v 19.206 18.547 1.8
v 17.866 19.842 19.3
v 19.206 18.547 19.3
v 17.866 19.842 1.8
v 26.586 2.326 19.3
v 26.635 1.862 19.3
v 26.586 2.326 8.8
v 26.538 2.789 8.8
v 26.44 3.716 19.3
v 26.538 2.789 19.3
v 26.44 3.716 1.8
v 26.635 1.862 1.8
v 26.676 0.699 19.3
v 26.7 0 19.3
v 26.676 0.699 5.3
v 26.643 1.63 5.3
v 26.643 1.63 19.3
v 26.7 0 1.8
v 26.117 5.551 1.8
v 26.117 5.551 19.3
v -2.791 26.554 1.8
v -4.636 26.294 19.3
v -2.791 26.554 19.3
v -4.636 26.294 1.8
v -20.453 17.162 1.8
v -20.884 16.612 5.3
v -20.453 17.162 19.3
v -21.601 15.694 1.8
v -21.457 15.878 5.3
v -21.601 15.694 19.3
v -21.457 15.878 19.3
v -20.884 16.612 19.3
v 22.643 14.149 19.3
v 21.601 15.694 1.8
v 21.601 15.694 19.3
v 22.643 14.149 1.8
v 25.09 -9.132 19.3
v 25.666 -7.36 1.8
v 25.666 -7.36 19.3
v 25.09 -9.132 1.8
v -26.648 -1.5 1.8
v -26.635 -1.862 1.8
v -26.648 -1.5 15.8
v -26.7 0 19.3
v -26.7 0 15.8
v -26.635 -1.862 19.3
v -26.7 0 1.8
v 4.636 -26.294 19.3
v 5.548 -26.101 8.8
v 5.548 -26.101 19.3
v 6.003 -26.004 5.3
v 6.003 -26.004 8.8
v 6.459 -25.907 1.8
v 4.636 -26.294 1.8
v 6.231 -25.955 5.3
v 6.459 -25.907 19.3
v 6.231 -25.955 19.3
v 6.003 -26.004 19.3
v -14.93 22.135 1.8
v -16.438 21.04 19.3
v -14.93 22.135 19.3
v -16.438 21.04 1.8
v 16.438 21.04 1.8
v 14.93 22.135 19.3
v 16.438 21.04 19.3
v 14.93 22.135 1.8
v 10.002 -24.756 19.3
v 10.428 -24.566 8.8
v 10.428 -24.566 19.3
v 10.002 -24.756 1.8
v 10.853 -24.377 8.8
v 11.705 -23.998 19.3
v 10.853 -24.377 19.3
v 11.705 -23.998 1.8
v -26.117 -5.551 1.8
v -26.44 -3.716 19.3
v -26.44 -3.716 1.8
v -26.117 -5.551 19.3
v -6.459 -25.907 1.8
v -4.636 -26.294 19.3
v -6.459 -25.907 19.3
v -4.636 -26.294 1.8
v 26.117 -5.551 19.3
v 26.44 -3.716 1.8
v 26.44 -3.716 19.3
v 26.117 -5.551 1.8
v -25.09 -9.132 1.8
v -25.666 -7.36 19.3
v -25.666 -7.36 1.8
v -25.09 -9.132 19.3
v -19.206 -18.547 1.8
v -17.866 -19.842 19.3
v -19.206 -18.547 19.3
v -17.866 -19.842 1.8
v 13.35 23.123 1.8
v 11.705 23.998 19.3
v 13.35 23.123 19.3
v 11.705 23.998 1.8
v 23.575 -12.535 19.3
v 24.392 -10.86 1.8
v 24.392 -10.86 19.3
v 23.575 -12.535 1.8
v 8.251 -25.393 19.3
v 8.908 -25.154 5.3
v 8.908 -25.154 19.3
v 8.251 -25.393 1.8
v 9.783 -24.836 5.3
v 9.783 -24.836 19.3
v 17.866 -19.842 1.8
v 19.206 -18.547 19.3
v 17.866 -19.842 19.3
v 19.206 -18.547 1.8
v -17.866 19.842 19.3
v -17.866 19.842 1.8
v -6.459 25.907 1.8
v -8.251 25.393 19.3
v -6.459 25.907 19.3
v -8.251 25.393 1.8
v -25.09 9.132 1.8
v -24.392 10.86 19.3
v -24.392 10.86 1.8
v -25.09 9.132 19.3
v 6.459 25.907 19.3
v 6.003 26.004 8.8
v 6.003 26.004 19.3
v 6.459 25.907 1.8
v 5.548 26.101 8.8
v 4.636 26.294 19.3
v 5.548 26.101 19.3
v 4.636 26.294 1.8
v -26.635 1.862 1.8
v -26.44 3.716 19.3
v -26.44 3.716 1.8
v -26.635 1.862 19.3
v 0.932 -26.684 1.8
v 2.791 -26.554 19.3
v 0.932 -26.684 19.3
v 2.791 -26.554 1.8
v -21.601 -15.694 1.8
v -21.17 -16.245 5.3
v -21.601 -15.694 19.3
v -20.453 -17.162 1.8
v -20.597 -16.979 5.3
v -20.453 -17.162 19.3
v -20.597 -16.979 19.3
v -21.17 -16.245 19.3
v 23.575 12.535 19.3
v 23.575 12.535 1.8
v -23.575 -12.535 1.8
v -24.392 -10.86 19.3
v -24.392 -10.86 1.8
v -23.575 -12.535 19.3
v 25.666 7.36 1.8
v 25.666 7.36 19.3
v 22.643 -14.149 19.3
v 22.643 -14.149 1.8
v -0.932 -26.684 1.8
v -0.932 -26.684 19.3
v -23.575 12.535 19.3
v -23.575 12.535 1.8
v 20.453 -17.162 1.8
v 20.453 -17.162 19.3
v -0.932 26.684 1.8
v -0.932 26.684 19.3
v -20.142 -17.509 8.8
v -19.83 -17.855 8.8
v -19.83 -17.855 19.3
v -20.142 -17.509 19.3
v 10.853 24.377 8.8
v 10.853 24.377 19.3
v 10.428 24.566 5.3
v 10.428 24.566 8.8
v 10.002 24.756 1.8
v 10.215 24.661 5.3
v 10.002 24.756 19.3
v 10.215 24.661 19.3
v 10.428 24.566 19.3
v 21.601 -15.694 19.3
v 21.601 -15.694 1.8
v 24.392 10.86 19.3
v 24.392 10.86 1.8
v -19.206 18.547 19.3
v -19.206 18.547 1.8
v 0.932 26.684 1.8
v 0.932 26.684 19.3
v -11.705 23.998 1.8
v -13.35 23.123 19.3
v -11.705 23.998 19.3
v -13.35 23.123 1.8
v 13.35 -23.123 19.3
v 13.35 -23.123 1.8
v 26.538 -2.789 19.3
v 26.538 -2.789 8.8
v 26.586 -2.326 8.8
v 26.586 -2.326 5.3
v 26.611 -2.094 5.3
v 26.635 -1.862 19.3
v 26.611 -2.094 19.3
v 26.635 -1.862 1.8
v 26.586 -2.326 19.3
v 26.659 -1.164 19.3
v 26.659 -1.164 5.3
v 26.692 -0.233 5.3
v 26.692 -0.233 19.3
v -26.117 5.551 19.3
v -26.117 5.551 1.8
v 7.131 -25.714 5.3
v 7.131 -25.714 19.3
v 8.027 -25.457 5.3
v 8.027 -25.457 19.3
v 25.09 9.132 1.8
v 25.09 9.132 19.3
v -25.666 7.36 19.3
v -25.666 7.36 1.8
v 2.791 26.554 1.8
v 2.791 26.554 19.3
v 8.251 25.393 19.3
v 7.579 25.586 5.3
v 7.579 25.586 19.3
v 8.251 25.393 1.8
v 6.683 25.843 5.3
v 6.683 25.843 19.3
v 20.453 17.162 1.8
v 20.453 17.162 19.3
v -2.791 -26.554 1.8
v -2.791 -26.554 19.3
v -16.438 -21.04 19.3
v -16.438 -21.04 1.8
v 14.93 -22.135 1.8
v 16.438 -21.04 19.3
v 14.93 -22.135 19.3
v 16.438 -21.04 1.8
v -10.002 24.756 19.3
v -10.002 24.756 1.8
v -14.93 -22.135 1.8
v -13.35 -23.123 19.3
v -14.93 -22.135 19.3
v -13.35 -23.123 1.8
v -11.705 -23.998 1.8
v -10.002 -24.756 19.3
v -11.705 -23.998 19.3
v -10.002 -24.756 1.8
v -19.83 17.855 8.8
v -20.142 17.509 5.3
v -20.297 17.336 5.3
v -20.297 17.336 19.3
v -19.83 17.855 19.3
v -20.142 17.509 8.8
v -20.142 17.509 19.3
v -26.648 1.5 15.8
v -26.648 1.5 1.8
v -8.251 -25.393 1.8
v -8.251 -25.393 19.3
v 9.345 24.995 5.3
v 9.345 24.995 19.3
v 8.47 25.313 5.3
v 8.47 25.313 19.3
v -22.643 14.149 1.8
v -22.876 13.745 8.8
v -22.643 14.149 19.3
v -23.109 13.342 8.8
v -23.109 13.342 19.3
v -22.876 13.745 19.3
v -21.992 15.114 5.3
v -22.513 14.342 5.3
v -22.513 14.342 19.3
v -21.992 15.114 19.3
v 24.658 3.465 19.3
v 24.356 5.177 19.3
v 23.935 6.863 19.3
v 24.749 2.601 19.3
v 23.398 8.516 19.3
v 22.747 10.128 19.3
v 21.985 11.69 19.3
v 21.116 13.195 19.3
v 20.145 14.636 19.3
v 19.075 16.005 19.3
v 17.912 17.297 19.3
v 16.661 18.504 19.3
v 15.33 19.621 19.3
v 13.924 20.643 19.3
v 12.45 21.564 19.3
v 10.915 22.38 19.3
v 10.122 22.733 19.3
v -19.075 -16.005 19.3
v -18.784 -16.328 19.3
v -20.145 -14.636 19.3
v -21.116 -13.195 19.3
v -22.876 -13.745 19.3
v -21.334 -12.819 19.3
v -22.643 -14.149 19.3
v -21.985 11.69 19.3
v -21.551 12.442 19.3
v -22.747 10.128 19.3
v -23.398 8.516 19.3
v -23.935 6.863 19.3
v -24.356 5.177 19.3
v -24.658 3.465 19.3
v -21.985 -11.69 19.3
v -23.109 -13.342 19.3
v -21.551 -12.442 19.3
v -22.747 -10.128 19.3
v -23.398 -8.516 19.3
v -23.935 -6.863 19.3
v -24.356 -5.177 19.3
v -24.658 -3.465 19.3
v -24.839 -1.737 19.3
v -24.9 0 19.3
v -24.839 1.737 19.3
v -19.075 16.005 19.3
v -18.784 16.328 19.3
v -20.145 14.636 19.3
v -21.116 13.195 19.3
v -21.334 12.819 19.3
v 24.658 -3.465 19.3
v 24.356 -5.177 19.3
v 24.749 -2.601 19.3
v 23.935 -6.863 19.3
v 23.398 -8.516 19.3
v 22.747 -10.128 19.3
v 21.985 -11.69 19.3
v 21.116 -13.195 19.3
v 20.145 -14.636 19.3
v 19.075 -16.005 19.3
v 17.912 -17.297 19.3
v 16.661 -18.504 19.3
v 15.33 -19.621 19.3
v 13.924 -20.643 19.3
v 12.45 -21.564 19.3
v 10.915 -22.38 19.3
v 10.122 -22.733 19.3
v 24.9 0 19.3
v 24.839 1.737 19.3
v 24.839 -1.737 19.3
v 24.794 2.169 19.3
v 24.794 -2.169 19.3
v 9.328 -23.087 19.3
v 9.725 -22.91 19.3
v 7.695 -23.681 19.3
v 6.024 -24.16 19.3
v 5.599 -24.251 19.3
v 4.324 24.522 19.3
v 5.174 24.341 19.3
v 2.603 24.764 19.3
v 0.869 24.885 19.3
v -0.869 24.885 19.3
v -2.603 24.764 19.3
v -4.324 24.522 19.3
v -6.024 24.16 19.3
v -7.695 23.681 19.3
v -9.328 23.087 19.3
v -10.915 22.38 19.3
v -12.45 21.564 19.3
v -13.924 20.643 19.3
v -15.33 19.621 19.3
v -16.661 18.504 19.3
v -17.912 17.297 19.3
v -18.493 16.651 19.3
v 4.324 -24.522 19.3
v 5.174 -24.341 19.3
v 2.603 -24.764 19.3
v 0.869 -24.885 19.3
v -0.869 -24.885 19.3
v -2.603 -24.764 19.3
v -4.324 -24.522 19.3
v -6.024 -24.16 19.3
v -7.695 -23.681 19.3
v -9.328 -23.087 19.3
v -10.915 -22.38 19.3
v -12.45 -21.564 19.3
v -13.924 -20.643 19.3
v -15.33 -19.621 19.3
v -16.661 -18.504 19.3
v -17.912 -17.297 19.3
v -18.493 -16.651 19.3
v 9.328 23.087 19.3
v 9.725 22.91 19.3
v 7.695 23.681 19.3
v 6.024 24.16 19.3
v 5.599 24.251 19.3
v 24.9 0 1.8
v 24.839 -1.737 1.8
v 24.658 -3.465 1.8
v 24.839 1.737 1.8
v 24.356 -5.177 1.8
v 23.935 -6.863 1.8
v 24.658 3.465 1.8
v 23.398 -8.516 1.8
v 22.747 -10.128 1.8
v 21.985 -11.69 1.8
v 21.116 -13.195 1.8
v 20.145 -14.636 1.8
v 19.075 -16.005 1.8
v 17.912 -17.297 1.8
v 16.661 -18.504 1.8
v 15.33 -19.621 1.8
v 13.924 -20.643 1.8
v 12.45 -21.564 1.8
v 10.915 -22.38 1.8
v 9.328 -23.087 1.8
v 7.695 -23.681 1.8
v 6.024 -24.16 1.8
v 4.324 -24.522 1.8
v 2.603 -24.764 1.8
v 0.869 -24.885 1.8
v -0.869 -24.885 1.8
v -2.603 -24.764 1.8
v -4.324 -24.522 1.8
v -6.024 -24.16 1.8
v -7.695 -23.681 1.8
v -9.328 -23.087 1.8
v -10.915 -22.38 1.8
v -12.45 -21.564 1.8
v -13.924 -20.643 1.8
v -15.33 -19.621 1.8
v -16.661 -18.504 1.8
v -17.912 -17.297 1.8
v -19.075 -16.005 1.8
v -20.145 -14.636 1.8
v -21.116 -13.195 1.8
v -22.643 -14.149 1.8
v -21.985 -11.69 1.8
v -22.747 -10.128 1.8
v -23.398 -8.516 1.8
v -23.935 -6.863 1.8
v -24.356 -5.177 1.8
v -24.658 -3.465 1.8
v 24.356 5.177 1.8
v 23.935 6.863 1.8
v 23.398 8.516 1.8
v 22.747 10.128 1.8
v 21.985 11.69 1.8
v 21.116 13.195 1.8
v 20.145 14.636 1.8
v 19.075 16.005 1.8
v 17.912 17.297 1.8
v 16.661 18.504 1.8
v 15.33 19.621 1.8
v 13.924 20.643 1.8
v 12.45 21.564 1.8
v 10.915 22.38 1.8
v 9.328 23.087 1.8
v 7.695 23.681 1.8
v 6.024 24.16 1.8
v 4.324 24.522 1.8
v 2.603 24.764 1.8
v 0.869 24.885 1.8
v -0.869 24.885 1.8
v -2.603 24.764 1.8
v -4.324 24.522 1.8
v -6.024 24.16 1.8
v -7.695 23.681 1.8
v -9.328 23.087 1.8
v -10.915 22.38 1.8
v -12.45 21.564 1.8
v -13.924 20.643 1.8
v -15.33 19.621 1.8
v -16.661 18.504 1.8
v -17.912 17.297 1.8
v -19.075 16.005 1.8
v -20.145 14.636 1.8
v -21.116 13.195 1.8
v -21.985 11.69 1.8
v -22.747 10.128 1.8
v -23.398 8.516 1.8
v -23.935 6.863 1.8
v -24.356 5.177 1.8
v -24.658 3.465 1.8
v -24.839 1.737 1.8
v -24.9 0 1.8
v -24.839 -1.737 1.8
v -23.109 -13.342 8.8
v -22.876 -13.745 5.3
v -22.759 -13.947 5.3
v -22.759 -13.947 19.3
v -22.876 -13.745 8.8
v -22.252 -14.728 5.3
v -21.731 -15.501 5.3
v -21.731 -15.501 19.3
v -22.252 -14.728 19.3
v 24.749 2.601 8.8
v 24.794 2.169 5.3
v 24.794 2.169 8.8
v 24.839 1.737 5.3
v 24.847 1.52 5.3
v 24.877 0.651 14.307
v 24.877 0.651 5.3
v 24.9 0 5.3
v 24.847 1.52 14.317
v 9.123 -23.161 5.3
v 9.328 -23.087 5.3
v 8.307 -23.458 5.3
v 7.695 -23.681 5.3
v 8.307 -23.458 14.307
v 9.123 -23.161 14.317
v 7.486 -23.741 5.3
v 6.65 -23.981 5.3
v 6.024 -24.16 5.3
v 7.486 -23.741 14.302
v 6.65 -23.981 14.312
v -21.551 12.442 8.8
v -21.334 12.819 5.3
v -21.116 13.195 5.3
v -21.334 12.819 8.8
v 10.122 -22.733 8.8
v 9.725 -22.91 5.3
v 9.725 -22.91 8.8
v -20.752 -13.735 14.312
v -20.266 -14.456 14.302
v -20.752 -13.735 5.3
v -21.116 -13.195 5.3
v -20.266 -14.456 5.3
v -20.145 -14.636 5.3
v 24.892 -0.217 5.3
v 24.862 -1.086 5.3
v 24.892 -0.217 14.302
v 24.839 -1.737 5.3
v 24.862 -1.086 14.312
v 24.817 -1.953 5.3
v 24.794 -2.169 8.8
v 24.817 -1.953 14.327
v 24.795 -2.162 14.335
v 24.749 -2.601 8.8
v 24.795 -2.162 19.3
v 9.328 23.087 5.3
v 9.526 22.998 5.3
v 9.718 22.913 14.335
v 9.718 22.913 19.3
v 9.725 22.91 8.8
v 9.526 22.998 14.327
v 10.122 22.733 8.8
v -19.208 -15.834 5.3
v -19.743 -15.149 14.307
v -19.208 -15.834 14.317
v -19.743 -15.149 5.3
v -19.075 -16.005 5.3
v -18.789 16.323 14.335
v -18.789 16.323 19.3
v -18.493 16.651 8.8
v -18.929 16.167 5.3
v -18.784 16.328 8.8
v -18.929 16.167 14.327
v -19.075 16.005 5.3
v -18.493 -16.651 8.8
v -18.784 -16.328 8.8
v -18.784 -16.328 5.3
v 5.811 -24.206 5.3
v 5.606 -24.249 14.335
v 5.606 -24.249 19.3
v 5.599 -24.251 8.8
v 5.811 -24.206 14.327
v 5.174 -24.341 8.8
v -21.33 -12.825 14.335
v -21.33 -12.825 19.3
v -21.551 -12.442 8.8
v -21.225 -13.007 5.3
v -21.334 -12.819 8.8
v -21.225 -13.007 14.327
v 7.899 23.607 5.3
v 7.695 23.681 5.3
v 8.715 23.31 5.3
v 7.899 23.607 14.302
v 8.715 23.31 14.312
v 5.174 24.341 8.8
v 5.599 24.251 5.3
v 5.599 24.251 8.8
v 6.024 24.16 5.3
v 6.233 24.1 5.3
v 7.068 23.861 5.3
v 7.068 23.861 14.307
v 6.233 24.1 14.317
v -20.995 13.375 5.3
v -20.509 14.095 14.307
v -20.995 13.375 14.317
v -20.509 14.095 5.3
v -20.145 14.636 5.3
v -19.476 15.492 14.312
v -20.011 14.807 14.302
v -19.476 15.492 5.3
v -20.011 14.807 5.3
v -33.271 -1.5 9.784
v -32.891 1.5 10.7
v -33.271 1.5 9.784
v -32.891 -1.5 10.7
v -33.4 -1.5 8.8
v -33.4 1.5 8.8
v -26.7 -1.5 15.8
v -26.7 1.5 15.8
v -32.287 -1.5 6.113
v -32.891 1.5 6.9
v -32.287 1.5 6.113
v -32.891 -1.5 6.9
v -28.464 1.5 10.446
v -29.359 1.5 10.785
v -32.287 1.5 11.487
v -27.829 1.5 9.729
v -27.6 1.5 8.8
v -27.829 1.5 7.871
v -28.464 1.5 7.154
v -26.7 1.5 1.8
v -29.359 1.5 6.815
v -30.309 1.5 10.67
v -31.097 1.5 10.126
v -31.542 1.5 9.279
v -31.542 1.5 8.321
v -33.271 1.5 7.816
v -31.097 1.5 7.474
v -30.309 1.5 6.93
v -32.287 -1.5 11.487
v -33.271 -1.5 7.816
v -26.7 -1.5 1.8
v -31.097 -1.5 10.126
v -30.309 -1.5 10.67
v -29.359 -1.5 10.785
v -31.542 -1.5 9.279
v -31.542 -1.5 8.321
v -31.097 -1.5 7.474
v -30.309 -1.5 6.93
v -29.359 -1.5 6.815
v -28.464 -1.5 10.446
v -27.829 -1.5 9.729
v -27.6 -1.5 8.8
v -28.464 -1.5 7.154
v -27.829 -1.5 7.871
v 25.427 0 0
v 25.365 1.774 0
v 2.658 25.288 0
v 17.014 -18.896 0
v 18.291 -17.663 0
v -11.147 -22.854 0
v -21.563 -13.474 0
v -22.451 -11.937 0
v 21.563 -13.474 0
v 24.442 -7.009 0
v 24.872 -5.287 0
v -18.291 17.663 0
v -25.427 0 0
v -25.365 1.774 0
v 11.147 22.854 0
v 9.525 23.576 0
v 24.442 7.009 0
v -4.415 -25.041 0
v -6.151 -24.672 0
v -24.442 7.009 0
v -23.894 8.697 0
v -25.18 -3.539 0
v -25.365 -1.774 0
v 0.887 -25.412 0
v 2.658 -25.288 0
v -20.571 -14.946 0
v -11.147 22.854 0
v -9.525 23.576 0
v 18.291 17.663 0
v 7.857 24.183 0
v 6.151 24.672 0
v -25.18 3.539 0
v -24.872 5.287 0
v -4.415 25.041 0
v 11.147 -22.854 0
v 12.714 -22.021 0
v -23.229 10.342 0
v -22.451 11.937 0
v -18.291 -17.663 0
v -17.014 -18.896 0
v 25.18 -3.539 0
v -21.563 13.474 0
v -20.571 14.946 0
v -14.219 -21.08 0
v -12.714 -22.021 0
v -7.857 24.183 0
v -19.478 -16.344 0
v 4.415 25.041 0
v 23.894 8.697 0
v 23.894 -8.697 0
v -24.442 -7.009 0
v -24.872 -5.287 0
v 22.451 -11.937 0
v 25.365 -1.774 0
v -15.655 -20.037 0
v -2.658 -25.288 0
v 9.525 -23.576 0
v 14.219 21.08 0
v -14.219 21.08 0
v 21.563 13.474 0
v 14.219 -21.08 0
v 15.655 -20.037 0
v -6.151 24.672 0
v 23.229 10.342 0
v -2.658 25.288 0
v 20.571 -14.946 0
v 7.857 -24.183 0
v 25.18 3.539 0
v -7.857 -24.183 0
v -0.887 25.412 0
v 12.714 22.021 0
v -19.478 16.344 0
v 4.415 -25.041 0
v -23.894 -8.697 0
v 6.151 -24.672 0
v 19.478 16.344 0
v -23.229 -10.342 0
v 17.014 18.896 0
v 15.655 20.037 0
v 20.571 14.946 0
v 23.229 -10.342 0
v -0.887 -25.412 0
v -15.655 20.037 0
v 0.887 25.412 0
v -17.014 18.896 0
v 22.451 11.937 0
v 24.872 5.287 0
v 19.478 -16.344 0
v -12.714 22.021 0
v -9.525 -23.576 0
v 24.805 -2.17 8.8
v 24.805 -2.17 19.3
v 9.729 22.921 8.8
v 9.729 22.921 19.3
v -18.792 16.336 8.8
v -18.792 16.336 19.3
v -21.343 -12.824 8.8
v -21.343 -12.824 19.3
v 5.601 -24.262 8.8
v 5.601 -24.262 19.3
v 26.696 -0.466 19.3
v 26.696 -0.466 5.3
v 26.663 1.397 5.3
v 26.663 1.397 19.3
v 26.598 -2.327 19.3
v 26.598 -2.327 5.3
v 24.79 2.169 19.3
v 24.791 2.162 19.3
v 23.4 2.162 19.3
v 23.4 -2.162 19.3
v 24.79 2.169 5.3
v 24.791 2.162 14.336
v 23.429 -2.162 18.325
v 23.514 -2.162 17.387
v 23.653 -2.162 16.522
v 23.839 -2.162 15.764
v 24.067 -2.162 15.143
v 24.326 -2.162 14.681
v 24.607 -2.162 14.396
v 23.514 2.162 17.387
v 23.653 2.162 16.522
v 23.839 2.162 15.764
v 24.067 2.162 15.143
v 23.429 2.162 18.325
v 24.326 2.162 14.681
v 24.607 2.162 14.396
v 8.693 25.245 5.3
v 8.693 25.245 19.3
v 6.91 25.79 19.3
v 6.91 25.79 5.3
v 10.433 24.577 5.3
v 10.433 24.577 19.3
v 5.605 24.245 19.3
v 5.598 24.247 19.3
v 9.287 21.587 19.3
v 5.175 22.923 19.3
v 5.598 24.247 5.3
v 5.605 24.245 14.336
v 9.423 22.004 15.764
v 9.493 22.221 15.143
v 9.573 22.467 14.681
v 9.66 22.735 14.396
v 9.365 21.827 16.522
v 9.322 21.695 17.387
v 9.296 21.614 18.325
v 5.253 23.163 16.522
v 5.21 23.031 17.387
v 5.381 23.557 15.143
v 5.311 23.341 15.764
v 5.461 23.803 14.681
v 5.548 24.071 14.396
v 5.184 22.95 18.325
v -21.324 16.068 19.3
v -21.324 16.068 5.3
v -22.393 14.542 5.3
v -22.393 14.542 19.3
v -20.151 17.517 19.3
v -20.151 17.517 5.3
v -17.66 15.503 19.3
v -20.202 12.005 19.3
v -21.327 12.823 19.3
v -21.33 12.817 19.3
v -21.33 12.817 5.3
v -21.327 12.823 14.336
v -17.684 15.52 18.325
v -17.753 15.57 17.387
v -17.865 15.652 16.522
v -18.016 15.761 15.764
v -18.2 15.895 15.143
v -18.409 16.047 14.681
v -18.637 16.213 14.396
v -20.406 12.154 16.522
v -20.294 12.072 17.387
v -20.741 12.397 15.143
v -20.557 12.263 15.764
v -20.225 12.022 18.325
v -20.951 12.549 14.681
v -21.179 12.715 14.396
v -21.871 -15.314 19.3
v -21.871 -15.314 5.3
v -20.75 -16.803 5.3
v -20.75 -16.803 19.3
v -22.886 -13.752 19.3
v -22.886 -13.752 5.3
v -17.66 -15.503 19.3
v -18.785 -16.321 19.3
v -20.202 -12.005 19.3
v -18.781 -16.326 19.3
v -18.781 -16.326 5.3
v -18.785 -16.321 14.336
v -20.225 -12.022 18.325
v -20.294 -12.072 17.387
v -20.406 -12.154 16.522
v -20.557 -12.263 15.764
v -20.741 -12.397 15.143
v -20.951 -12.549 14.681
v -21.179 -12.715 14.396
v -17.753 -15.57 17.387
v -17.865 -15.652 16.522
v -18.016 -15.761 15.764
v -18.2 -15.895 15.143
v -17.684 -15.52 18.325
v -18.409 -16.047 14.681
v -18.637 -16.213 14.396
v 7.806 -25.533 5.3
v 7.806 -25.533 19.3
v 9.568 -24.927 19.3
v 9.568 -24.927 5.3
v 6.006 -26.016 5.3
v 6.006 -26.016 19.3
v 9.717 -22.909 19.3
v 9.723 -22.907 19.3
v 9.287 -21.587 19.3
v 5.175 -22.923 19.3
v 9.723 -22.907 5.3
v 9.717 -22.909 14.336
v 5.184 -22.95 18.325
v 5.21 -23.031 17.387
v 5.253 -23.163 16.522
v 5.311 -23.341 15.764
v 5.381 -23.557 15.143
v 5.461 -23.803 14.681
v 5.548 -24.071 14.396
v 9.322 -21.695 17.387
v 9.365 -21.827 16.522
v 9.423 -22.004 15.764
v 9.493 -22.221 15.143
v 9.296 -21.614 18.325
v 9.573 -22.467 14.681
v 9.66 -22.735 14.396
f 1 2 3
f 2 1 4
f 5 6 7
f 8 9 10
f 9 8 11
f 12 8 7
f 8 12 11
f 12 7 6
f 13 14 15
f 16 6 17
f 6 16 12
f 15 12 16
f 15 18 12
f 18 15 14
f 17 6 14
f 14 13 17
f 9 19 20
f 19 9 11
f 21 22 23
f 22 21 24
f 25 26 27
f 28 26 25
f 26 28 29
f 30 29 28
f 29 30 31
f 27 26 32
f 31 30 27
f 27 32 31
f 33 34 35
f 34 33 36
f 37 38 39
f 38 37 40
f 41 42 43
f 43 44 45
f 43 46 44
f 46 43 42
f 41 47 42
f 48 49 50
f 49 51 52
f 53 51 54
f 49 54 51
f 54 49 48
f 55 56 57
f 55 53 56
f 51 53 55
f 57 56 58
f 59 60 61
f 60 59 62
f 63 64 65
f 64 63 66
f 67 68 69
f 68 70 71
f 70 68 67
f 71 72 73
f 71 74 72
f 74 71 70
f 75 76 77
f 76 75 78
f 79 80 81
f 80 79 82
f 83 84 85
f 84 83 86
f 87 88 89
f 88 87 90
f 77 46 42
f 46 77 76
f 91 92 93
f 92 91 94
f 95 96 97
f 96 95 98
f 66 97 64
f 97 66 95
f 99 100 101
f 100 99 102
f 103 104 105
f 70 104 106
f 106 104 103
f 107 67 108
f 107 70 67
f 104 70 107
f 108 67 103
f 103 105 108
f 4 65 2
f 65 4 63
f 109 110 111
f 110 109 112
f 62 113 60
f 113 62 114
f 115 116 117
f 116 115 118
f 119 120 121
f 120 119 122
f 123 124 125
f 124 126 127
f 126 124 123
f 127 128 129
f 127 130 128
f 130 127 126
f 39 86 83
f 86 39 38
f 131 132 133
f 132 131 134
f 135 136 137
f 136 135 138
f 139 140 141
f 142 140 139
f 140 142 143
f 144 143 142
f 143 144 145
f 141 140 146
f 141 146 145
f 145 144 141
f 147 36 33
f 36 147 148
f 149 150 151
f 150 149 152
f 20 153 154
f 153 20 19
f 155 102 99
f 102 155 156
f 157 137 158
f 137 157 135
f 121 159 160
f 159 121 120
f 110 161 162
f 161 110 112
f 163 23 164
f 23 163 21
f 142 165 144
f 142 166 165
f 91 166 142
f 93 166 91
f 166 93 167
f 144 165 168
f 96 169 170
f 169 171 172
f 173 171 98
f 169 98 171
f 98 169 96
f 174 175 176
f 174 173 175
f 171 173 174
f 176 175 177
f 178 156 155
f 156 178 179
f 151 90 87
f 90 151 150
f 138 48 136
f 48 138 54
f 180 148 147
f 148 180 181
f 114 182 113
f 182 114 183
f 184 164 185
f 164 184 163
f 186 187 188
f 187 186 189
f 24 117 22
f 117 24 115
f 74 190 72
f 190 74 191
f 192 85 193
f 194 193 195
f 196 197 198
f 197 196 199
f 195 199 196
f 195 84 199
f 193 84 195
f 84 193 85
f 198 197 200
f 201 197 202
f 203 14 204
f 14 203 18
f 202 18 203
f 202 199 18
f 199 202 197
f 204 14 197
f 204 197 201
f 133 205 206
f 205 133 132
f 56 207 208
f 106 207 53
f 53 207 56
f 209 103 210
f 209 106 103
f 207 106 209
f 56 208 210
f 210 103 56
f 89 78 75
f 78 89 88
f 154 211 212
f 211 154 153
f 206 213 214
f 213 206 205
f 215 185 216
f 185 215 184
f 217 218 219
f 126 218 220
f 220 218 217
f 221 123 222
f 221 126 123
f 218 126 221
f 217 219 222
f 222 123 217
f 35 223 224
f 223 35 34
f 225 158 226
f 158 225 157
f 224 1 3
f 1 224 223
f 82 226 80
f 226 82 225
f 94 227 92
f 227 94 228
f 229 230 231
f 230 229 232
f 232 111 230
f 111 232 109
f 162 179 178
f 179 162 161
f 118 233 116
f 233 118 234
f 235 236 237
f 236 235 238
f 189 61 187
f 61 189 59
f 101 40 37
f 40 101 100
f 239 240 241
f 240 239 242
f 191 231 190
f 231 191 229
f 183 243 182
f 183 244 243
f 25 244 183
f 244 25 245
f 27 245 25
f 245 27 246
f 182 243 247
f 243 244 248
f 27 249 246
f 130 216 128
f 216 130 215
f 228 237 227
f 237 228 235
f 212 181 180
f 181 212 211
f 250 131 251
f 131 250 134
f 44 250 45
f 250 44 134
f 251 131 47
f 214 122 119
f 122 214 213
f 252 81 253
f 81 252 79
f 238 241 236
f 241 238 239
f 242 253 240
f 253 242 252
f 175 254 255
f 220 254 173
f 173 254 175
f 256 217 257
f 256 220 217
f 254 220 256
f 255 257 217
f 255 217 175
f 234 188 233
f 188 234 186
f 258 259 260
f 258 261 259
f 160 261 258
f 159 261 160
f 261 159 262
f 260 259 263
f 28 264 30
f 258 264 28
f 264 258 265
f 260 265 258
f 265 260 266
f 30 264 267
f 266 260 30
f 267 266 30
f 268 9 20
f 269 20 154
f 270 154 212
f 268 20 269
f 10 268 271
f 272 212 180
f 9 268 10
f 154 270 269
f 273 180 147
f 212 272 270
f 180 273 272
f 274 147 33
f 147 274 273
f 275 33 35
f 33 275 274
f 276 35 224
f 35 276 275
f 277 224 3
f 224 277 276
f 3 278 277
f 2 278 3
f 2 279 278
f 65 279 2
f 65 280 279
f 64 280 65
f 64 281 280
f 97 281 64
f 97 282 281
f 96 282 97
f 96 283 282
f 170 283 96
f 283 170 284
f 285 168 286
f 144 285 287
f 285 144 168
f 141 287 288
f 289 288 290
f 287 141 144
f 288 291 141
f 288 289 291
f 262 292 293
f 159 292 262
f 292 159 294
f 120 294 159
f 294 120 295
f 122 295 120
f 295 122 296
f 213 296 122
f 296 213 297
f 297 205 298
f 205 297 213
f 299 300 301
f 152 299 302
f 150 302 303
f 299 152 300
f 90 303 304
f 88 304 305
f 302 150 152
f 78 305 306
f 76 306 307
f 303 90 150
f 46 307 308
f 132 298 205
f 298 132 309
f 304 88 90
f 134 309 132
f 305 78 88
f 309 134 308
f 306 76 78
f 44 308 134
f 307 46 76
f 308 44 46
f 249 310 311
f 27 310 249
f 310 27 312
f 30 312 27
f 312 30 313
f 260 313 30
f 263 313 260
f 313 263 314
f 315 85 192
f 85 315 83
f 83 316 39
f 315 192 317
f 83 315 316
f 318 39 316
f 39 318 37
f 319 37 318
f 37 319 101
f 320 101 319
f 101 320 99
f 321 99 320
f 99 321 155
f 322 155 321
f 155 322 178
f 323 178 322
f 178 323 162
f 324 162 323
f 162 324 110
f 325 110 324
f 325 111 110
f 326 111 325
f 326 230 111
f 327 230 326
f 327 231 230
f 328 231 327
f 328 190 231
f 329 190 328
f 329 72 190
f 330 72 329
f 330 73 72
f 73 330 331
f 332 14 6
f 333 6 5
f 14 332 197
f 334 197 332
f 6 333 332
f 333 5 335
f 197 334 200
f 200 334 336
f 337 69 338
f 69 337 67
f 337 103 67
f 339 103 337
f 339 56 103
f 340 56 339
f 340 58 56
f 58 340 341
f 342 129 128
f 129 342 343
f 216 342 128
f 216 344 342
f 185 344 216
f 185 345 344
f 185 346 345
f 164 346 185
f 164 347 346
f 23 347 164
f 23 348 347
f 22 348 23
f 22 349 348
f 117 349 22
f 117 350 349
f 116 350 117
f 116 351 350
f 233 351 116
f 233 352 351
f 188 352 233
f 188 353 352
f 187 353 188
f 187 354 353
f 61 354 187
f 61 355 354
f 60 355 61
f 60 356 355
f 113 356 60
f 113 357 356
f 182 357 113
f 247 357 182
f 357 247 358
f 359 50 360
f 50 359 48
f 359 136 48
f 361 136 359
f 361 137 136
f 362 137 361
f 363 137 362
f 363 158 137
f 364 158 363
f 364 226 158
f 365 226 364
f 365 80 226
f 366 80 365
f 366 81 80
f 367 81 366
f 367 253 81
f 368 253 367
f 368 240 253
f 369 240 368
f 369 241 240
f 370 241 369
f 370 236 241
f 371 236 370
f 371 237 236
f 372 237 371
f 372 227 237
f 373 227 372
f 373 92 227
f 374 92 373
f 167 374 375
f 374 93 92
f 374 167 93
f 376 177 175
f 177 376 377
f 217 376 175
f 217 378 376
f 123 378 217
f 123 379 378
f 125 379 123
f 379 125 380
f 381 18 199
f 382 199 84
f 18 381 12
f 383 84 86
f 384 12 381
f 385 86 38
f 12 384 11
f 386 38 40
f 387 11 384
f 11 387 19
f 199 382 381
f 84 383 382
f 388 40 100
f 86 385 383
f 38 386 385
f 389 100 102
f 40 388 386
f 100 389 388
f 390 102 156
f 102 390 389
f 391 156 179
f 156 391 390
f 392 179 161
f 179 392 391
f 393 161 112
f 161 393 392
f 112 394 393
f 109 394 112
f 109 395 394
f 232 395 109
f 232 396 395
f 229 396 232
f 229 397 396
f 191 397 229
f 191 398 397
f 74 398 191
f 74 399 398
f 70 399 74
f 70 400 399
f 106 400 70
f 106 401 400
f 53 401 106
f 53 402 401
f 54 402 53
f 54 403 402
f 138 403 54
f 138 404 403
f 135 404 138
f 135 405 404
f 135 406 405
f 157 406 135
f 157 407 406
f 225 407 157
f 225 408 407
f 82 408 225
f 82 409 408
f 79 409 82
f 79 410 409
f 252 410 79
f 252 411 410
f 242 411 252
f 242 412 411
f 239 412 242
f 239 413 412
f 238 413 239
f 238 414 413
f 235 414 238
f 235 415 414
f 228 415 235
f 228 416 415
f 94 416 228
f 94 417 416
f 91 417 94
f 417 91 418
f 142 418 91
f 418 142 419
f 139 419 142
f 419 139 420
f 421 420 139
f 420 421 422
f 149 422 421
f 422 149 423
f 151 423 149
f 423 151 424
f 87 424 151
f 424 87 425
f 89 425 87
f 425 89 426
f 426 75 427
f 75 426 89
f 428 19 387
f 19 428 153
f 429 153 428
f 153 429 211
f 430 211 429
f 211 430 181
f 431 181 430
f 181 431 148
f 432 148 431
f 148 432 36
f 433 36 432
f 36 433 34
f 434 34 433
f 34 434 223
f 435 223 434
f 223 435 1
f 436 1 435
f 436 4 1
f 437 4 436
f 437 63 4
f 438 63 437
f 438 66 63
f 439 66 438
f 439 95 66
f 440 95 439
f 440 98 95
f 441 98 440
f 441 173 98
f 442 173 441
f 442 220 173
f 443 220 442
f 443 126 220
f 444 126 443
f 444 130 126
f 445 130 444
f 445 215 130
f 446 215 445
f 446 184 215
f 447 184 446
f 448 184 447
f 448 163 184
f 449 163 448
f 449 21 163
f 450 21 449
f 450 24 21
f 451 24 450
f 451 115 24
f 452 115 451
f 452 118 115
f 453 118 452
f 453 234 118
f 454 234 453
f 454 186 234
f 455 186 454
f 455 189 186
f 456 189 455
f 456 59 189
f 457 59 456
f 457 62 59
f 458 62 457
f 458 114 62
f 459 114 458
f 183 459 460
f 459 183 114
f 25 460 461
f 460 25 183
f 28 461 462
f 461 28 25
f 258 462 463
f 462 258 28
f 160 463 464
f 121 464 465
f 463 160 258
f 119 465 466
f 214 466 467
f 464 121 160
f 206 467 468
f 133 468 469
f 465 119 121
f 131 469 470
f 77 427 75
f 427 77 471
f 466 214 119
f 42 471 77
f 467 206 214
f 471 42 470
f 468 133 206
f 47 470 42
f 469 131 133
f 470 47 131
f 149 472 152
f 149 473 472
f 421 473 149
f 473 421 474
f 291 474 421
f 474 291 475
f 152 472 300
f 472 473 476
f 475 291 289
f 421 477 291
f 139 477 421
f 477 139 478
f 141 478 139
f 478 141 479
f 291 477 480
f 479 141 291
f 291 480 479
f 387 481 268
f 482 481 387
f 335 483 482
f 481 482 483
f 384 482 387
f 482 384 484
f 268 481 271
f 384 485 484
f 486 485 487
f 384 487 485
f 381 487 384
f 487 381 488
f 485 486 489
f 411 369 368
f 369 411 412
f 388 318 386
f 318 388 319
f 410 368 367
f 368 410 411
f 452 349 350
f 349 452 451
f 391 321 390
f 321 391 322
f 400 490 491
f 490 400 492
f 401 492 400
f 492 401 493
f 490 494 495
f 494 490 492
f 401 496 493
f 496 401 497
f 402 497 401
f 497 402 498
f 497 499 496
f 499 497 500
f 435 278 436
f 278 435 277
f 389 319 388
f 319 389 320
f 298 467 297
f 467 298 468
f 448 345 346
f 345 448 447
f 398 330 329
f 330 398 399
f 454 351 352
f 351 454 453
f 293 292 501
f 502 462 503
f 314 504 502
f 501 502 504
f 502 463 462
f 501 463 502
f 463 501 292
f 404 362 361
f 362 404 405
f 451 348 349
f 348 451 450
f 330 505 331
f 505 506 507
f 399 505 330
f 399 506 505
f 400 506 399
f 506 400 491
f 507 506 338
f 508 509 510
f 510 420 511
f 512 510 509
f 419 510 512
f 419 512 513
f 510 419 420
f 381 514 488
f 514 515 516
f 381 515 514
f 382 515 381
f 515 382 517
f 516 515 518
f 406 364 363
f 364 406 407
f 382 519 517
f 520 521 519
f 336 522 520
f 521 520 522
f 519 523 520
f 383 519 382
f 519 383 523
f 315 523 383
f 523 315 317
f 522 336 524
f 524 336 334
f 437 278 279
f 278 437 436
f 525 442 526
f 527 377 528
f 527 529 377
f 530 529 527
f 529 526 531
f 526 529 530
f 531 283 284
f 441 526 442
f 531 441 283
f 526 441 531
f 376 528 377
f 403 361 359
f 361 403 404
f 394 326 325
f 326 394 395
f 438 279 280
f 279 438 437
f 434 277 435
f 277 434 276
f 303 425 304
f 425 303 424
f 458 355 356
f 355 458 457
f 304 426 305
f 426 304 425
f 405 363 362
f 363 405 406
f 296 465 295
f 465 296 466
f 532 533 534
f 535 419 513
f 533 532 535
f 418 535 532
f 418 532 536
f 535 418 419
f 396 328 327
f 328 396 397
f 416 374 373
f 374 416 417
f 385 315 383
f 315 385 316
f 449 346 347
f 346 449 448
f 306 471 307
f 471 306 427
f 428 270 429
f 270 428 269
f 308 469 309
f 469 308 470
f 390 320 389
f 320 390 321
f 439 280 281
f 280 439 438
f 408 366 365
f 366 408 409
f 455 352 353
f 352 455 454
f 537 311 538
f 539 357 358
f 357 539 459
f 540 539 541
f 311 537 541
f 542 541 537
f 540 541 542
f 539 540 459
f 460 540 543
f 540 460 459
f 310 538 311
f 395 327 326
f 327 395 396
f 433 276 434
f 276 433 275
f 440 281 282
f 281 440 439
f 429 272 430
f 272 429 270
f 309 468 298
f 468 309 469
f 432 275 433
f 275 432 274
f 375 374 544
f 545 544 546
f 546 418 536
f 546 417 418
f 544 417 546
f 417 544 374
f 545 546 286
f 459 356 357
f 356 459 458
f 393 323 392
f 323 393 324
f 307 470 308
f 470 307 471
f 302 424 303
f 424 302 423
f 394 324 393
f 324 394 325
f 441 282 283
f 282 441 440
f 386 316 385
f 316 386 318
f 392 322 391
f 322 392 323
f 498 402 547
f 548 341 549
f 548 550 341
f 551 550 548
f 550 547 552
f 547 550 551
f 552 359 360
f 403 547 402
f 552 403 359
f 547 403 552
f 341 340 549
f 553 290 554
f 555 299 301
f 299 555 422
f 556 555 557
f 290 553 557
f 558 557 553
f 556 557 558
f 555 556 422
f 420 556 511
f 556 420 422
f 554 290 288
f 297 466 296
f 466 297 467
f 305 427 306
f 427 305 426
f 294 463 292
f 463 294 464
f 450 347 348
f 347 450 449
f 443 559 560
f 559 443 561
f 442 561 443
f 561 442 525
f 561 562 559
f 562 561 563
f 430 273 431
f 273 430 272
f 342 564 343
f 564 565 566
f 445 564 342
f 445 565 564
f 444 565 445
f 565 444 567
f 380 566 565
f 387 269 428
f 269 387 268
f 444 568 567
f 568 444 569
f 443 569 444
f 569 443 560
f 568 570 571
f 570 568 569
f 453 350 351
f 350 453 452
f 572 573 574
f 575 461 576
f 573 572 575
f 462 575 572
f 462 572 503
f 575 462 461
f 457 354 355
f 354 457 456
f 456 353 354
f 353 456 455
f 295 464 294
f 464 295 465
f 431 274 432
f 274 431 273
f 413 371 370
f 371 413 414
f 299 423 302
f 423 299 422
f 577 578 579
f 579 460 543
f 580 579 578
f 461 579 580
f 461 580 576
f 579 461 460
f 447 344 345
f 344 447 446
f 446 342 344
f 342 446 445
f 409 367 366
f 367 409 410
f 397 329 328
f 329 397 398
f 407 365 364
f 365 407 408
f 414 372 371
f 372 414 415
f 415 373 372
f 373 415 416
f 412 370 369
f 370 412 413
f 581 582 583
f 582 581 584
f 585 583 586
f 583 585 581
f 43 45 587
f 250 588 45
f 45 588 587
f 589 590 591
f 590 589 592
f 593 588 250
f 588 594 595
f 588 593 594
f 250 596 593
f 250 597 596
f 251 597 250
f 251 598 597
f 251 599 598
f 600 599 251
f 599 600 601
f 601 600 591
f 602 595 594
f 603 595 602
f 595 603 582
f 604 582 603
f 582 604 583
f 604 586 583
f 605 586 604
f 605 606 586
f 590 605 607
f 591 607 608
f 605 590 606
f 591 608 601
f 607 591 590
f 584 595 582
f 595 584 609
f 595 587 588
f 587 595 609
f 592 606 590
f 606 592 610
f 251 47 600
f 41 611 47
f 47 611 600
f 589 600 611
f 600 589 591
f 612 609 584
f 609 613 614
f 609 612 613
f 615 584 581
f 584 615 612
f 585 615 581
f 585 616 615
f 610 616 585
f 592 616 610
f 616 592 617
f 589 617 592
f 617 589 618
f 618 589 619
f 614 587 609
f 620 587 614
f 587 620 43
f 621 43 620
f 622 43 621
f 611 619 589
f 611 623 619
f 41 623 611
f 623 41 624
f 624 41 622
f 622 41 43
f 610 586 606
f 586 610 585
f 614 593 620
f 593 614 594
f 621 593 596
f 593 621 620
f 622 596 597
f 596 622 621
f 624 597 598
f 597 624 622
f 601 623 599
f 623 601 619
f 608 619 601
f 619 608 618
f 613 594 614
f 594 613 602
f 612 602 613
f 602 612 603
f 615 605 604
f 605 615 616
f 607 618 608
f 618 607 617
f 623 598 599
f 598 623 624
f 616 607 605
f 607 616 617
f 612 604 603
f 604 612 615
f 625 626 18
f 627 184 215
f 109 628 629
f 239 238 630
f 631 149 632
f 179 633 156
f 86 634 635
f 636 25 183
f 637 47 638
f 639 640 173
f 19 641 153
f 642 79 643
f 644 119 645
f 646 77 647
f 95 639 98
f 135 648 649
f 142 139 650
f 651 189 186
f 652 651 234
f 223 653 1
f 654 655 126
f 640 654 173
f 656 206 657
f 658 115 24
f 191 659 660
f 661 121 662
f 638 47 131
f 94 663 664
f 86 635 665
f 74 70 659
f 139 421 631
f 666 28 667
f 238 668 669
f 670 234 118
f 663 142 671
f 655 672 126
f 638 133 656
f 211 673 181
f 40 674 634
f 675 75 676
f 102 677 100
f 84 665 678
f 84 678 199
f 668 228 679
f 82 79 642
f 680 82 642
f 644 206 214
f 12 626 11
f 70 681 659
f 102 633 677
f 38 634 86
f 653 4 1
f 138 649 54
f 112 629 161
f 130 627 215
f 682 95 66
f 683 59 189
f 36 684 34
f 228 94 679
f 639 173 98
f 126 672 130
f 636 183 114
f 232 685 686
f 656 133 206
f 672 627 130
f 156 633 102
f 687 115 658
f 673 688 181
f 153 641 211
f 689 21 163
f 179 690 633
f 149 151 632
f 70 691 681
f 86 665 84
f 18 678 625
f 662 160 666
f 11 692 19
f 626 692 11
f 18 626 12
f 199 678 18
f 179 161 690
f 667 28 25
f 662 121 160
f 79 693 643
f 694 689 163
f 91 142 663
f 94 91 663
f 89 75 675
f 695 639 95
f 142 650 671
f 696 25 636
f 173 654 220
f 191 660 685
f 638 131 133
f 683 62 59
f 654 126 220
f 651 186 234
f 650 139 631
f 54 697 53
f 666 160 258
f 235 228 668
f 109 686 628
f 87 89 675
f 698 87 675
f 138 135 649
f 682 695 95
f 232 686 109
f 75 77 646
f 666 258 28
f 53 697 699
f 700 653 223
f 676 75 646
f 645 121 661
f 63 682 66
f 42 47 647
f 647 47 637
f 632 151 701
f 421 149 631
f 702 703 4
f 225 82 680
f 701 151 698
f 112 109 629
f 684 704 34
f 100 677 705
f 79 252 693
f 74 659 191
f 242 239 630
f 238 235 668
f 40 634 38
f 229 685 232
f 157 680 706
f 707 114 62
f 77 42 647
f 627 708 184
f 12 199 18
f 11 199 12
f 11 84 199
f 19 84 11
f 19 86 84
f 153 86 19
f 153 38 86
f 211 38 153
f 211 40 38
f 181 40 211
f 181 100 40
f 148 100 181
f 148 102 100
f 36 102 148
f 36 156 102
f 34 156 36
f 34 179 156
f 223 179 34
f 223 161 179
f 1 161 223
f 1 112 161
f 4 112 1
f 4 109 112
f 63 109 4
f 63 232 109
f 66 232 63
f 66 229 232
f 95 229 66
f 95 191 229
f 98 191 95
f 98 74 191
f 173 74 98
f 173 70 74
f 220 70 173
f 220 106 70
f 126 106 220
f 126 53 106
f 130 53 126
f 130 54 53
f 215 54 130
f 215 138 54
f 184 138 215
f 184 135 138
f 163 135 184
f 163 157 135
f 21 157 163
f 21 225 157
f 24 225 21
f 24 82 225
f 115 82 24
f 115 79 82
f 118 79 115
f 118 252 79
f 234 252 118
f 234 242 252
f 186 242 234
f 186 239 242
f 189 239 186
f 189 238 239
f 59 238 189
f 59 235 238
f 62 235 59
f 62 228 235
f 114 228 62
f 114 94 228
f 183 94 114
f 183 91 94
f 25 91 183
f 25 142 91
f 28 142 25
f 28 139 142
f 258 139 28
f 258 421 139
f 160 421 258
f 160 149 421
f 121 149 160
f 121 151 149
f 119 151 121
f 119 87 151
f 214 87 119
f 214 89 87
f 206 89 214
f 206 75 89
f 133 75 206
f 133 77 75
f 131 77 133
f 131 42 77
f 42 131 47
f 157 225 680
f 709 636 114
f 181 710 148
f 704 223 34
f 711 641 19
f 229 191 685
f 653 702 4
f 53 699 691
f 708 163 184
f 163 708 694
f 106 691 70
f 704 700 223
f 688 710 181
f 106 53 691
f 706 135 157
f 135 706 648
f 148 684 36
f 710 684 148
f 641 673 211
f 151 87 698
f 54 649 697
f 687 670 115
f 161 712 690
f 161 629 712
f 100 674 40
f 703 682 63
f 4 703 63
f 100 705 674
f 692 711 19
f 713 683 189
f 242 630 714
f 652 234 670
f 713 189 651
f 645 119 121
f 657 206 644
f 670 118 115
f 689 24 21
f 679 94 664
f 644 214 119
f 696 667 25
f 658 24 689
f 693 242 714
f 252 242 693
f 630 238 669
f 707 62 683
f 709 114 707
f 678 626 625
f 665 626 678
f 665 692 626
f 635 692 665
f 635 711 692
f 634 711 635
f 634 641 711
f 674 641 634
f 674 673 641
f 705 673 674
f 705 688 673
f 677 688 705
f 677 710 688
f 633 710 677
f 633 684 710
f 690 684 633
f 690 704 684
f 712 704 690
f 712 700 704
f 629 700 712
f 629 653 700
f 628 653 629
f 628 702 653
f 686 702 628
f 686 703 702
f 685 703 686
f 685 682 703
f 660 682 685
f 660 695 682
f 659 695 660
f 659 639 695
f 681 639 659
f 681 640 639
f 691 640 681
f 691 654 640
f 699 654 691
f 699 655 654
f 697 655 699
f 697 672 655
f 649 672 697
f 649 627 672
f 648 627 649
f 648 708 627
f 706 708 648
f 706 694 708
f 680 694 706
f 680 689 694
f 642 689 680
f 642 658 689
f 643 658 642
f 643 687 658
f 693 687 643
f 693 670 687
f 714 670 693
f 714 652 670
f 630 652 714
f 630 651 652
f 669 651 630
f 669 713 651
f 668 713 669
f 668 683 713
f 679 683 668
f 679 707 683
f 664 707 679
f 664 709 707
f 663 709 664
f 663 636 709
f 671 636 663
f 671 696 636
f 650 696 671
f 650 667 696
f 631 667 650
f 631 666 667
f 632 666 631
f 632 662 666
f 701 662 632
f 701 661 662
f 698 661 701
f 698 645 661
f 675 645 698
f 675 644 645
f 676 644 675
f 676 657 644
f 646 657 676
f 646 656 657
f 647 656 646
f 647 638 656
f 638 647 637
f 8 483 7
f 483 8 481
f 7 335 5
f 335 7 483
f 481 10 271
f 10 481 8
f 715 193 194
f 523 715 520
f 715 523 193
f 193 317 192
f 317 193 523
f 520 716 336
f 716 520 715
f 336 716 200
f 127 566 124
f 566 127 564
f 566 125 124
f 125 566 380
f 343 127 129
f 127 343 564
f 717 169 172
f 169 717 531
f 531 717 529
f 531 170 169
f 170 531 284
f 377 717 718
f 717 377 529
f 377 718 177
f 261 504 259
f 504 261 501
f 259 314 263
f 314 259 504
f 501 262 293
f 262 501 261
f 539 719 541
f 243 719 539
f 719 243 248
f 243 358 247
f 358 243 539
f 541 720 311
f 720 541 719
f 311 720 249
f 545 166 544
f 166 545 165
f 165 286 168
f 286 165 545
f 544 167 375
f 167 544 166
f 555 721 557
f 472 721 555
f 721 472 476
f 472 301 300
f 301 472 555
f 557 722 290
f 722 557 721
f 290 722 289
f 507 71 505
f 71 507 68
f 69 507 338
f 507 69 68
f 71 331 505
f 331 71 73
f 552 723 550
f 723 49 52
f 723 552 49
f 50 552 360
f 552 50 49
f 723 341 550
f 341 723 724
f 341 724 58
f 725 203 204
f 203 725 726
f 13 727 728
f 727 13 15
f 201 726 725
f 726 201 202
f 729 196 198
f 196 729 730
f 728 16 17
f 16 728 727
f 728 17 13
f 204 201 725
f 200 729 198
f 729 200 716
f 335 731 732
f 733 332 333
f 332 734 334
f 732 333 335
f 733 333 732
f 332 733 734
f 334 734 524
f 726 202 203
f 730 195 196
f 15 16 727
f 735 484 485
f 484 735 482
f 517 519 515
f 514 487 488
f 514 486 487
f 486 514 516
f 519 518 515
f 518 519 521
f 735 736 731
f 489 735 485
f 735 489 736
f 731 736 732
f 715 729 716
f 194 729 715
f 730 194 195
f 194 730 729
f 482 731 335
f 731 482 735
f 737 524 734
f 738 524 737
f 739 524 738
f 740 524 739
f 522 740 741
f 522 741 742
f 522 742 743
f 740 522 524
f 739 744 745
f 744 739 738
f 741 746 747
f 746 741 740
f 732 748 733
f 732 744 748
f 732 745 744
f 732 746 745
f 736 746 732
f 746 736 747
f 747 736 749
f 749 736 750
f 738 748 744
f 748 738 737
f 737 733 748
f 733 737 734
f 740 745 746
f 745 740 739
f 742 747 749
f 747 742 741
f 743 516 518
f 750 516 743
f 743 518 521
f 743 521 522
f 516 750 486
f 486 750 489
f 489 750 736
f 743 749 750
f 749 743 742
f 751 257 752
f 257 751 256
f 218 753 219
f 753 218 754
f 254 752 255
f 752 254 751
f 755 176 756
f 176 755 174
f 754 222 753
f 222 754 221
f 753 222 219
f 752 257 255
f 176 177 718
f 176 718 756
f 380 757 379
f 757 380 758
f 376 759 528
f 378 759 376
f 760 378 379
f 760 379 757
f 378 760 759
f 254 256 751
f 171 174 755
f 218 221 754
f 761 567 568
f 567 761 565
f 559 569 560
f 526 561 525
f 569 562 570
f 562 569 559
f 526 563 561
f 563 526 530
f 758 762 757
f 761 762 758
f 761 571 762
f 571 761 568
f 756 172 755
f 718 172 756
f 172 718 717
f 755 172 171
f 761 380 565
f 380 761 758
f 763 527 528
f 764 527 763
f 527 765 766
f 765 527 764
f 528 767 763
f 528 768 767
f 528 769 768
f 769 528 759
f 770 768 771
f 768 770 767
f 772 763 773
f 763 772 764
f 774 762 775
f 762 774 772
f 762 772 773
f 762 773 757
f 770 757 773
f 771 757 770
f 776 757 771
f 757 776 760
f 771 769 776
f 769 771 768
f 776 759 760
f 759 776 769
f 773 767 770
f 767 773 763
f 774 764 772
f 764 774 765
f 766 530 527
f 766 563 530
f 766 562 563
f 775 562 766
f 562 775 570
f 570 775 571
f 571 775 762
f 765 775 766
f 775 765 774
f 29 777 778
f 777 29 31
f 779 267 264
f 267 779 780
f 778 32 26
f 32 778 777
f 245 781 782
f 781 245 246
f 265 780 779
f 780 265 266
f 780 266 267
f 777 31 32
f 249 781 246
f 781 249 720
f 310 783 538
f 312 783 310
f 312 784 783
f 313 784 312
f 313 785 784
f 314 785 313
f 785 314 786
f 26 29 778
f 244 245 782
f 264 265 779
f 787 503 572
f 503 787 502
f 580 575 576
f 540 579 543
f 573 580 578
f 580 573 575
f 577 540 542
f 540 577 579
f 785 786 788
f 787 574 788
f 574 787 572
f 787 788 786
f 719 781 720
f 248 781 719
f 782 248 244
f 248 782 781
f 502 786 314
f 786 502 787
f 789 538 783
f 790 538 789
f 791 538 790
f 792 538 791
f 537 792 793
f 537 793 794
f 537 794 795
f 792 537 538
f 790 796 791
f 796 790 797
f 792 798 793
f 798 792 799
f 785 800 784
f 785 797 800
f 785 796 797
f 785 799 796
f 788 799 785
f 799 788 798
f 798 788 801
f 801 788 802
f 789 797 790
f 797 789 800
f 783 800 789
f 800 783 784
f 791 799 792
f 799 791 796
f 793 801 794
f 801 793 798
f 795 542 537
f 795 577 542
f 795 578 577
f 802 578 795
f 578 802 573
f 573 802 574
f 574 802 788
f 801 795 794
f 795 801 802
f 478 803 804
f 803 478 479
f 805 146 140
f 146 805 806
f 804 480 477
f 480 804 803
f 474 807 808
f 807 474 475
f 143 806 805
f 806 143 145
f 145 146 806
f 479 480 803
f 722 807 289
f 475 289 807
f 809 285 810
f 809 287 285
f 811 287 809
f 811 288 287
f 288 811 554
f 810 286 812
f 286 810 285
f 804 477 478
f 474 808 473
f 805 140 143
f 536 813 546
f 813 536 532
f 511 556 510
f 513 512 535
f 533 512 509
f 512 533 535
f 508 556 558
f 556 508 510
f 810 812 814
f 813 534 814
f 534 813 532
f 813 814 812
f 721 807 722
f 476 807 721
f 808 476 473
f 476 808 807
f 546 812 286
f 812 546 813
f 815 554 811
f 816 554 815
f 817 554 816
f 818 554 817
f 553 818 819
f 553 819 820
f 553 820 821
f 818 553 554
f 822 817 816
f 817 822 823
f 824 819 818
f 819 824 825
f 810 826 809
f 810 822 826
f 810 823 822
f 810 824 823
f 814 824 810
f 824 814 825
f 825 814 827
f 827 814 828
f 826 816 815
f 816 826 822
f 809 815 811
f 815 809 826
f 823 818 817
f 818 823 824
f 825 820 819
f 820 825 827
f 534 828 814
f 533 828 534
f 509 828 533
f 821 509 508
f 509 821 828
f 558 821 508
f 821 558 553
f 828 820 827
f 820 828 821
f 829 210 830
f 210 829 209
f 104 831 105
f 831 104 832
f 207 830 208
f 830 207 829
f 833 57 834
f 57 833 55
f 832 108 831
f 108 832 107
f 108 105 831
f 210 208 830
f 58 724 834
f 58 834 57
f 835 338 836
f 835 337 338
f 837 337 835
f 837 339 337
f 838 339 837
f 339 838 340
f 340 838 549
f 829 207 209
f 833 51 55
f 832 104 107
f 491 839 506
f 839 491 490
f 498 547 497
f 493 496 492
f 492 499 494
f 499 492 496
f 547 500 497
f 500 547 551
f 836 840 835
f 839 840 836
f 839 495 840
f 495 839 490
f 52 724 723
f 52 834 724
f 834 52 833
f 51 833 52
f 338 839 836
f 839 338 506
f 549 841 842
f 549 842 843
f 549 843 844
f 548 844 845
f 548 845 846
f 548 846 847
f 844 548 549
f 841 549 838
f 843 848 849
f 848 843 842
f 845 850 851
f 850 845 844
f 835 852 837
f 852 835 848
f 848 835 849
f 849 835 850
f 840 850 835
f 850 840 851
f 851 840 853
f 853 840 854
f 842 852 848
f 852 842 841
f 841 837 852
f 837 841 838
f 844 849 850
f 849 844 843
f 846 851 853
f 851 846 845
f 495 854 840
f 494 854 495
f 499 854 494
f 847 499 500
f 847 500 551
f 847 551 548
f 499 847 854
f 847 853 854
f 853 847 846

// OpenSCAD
$fa = 4;
$fs = 1;

lens_diameter = 49.8;
lens_height = 14;
thickness = 1.8;
angle = 45;
thingy = 5;
thing_size = 3;
thing_angle = 10;
hole_radius = 2;
hole_radius2 = hole_radius + thickness;
hole_thickness = 3;

radius = lens_diameter / 2;
radius2 = radius + thickness;
ta = thing_angle;

//difference() {
	union() {
		difference() {
			base();
			part_2();
		}
		part_1();
	}
	//part_2();
//}

module part_1() {
	for ( i = [0 : thingy-1] )
	{
		rotate([0,0,i * 360/thingy])
		translate([0,0, 3.5 + thickness])
		union() {
			rotate([0,0,-5]) pie_slice(radius2, radius, ta, lens_height);
			translate([radius,sin(ta)*radius/2,lens_height])
                rotate([90,0,0])
                scale([thing_size / (5*2), 1, 1])
                intersection() {
                    cylinder(r = 5, h = sin(ta)*radius);
                    translate([-5, -10, 0]) cube([ 10, 10, radius]);
                }
		}
	}
}

module part_2() {
	gap = 1;
	for ( i = [0 : thingy-1] )
	{
		rotate([0,0,i * 360/thingy])
		translate([0,0,lens_height/2 + thickness]) {
			rotate([0,0,ta/2]) pie_slice(radius2 + 1, radius -1 , gap, lens_height + 4);
			rotate([0,0,-ta/2 -gap]) pie_slice(radius2 + 1, radius - 1, gap, lens_height + 4);
		}
	}
}

module base() {
	union() {
		translate([0,0, thickness]) tube(radius2, radius, lens_height + 3.5);
		cylinder(h = thickness, r1 = radius2 - thickness * sin(angle), r2 = radius2);
		translate([-radius2 - (hole_radius2 + hole_radius)/2,hole_thickness/2,lens_height/2 + thickness]) rotate([90,0,0]) for_wire();
	}
}

module for_wire() {
	difference(){
		hull() {
			cylinder(h=hole_thickness, r=hole_radius2);
			translate([(hole_radius2 + hole_radius)/2,-lens_height/2,0]) cube([thickness, lens_height, hole_thickness]);
		}
		translate([0,0,-0.5]) cylinder(h=hole_thickness+1, r=hole_radius);
	}
}

//lib stuff

module tube(outer_radius, inner_radius, height) {
    difference() {
        cylinder(h = height, r = outer_radius);
        translate([ 0, 0, -1]) cylinder(h = height + 2, r = inner_radius);
    }
}

module pie_slice(outer_radius, inner_radius, angle, height) {
    o1 = outer_radius + 1;
    blocking_half = [2* o1, o1, height + 1];
        blocking_quarter = [o1, o1, height + 1];
        if (angle <= 0) {
                //nothing
        } else if (angle <= 90) {
                difference() {
                        tube(outer_radius, inner_radius, height);
                        translate([-o1, -o1, -0.5]) cube(blocking_half);
                        translate([-o1, -0.5, -0.5]) cube(blocking_quarter);
                        rotate([0,0,angle]) translate([0, 0, -0.5]) cube(blocking_quarter);
                }
        } else if (angle <= 180) {
                difference() {
                        tube(outer_radius, inner_radius, height);
                        translate([-o1, -o1, -0.5]) cube(blocking_half);
                        rotate([0,0,angle]) translate([0, 0, -0.5]) cube(blocking_quarter);
                }
        } else if (angle <= 270) {
                difference() {
                        tube(outer_radius, inner_radius, height);
                        translate([0, -o1, -0.5]) cube(blocking_quarter);
                        rotate([0,0,angle]) translate([0, 0, -0.5]) cube(blocking_quarter);
                }
        } else if (angle <= 360) {
                difference() {
                        tube(outer_radius, inner_radius, height);
                        intersection() {
                                translate([0, -o1, -0.5]) cube(blocking_quarter);
                                rotate([0,0,angle]) translate([0, 0, -0.5]) cube(blocking_quarter);
                        }
                }
        } else {
                tube(outer_radius, inner_radius, height);
        }
}
